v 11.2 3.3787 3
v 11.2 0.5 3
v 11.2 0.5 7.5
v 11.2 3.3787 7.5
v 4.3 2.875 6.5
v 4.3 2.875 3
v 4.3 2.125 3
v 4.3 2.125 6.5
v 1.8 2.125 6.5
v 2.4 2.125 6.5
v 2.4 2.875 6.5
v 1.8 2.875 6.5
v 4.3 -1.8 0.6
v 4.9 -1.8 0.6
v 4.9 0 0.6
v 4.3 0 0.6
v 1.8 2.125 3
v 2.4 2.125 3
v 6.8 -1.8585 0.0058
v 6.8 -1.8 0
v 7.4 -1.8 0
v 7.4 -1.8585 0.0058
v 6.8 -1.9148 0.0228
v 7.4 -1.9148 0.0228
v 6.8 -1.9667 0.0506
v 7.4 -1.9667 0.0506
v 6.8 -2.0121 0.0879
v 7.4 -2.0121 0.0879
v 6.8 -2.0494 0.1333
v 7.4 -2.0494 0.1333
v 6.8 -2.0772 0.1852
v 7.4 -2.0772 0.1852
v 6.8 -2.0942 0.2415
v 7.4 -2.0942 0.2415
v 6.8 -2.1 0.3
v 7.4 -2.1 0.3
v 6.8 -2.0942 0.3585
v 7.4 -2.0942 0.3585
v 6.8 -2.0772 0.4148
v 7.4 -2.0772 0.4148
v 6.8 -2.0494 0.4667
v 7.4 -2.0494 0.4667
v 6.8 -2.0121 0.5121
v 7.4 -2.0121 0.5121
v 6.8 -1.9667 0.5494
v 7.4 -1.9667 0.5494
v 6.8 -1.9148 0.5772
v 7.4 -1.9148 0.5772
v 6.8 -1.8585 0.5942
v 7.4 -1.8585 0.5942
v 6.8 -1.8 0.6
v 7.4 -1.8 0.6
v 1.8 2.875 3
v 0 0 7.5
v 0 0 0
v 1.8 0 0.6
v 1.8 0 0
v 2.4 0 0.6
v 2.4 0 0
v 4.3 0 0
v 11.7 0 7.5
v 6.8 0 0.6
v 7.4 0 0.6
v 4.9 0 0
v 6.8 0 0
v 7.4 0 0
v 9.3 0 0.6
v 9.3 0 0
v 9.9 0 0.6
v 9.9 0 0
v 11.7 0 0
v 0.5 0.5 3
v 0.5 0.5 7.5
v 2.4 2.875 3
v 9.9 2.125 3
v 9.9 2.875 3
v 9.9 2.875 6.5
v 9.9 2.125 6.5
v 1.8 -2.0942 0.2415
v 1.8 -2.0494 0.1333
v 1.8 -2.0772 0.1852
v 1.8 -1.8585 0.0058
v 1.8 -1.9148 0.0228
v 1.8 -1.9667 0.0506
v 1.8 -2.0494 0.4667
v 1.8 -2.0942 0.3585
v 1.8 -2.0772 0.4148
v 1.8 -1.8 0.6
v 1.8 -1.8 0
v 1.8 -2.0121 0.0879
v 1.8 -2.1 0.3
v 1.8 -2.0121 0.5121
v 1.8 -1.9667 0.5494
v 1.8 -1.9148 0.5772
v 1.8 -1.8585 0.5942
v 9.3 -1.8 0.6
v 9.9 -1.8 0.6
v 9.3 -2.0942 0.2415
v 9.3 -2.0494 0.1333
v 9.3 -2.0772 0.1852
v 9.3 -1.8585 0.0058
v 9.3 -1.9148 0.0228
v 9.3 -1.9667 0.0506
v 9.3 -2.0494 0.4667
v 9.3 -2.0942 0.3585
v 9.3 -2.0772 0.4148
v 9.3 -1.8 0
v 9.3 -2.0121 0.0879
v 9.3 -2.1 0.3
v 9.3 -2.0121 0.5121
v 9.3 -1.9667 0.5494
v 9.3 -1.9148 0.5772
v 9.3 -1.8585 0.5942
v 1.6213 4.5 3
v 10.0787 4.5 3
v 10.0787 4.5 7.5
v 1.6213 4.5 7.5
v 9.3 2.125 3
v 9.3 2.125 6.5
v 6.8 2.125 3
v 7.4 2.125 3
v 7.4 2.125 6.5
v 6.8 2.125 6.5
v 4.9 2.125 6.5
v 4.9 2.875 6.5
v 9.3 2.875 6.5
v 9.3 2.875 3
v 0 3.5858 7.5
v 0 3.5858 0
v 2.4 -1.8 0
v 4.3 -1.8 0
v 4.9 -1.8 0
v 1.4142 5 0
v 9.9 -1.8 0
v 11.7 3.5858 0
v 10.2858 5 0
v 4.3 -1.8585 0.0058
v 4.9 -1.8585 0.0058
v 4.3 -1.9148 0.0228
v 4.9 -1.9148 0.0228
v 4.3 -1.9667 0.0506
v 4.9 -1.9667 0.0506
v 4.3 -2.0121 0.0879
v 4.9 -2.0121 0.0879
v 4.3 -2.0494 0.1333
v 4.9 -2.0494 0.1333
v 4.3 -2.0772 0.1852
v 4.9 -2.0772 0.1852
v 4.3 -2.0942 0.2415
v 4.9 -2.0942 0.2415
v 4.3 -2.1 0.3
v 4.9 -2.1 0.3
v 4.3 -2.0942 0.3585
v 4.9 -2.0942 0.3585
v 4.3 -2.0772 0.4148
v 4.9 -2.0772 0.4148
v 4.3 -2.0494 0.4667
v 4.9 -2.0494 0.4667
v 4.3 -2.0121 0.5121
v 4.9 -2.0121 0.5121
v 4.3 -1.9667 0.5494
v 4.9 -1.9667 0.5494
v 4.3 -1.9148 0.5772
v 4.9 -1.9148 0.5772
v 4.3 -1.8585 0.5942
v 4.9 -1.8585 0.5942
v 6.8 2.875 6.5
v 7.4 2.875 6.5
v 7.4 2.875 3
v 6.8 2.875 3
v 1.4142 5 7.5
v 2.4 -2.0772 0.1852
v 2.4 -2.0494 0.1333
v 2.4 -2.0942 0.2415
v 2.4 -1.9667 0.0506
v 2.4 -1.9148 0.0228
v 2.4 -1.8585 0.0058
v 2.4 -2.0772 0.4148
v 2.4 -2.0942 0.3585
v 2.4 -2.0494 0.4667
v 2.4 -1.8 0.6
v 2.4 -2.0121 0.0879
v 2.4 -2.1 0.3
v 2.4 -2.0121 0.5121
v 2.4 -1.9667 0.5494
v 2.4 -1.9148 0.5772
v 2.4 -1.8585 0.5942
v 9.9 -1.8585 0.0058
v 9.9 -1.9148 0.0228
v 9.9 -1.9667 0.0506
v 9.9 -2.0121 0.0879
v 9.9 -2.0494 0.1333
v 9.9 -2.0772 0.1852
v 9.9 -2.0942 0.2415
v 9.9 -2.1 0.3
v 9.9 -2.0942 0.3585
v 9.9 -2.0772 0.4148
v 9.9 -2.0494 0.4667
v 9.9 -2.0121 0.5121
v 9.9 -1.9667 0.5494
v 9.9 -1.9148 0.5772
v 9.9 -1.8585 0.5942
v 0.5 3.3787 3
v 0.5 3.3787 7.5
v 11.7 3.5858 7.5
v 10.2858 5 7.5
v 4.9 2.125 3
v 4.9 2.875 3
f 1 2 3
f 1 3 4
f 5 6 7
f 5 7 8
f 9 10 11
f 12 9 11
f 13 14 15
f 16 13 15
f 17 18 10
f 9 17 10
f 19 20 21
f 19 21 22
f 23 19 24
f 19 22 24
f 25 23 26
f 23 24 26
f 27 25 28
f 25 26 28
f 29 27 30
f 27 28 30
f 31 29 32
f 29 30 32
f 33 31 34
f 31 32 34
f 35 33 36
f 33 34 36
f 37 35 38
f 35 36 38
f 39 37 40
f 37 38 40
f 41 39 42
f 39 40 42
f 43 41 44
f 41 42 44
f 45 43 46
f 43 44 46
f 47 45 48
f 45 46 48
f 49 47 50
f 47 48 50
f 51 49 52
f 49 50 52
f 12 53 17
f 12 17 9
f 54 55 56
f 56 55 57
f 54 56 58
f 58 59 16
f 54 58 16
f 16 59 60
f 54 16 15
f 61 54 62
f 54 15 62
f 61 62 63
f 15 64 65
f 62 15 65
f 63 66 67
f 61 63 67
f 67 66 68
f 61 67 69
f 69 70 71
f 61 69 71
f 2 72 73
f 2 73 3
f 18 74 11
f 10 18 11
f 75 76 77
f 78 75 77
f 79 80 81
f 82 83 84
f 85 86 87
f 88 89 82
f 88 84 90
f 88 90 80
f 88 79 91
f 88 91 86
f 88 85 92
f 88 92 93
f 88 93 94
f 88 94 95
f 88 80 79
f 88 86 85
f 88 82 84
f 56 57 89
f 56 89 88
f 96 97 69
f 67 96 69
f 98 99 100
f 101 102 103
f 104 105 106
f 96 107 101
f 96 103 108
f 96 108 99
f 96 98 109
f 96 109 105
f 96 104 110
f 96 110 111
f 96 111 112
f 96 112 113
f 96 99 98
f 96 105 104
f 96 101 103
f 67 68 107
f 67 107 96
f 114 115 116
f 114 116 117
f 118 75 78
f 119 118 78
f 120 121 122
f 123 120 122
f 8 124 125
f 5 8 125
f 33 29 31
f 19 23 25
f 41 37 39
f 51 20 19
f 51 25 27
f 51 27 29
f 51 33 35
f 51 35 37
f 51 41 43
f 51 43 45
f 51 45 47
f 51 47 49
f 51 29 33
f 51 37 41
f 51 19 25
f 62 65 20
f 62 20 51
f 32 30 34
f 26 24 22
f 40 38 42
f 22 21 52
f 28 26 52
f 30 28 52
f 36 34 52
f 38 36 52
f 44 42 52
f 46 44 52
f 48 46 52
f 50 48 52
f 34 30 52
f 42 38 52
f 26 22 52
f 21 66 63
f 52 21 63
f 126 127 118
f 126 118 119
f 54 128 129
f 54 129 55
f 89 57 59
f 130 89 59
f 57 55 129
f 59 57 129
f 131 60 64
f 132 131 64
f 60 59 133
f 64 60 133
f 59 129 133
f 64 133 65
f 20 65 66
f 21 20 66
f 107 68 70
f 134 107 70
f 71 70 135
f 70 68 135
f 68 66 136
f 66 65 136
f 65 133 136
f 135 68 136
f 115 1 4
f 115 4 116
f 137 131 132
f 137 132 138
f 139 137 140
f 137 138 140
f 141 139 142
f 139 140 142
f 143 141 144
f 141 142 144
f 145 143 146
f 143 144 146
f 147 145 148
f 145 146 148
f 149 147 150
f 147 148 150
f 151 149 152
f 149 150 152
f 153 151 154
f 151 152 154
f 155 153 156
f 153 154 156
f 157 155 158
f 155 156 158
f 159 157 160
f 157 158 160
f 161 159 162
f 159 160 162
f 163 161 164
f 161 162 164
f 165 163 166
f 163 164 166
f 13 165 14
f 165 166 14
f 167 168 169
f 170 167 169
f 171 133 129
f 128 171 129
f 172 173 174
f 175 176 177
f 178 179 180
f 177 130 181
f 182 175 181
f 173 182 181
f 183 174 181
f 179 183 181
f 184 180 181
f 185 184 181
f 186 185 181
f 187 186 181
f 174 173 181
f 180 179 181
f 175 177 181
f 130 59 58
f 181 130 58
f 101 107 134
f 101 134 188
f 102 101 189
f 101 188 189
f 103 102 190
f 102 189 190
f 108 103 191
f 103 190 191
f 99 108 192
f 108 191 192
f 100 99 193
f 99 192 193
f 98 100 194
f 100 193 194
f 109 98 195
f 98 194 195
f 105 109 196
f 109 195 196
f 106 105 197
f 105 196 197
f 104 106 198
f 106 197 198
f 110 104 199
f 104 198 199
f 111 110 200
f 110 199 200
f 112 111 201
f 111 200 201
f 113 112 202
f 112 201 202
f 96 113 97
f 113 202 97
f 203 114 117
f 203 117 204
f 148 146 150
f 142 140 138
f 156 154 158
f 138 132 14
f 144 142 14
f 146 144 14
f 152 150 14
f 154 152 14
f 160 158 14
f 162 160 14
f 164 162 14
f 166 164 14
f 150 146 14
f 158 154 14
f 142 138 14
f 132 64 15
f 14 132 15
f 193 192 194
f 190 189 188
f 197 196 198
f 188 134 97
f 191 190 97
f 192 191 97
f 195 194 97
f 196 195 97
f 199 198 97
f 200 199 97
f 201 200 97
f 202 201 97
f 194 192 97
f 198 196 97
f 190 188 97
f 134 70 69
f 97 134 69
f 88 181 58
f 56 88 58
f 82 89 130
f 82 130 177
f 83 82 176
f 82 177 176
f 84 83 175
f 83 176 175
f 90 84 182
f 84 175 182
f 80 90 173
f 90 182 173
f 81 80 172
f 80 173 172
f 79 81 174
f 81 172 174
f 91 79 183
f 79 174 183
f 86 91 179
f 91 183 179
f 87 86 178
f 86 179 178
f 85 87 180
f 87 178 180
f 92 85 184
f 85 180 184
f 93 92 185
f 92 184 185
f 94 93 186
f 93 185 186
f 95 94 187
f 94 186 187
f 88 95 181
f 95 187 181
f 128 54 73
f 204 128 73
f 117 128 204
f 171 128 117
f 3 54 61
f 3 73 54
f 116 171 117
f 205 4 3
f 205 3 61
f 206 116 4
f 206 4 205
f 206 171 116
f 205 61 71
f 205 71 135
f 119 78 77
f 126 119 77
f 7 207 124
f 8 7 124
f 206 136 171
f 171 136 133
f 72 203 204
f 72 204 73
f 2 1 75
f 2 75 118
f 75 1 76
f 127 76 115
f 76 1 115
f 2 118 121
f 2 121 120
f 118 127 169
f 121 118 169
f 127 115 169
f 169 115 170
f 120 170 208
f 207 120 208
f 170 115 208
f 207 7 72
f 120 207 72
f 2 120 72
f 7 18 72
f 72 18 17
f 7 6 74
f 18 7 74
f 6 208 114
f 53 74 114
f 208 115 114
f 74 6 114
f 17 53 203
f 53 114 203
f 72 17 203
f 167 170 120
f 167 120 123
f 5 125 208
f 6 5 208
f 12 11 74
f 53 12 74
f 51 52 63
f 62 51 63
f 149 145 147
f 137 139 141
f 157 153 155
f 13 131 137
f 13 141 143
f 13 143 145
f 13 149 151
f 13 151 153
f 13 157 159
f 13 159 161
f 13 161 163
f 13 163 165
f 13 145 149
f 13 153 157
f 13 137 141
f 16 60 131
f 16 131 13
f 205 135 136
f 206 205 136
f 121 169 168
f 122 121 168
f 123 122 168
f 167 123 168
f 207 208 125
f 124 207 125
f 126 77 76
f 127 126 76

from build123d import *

# Parameters (mm, degrees)
EXTRUDE_THIN1_DEPTH = 7.5
BOSS_EXTRUDE1_DEPTH = 3
BOSS_EXTRUDE2_DEPTH = 0.3
LPATTERN1_COUNT     = 4
LPATTERN1_PITCH     = 2.5


with BuildPart() as part:
    # Sketch1 → Extrude-Thin1 (new body)
    with BuildSketch(Plane.XY):
        Polygon((0, 0), (11.7, 0), (11.7, 3.585786438), (10.285786438, 5), (1.414213562, 5), (0, 3.585786438), align=None)
        Polygon((0.5, 0.5), (11.2, 0.5), (11.2, 3.378679656), (10.078679656, 4.5), (1.621320344, 4.5), (0.5, 3.378679656), align=None, mode=Mode.SUBTRACT)
    extrude(amount=EXTRUDE_THIN1_DEPTH)

    # Sketch2 → Boss-Extrude1 (add)
    with BuildSketch(Plane(origin=(0, 0, 0), x_dir=(-1, 0, 0), z_dir=(0, 0, -1))):
        Polygon((0, 0), (0, 3.585786438), (-1.414213562, 5), (-10.285786438, 5), (-11.7, 3.585786438), (-11.7, 0), align=None)
    extrude(amount=-BOSS_EXTRUDE1_DEPTH)

    # Sketch3 → Boss-Extrude2 (add, symmetric)
    with BuildSketch(Plane(origin=(9.6, 0, 0), x_dir=(0, 0, -1), z_dir=(1, 0, 0))):
        with BuildLine():
            Line((-6.5, 2.875), (0, 2.875))
            Line((0, 2.875), (0, -1.8))
            ThreePointArc((0, -1.8), (-0.3, -2.1), (-0.6, -1.8))
            Line((-0.6, -1.8), (-0.6, 2.125))
            Line((-0.6, 2.125), (-6.5, 2.125))
            Line((-6.5, 2.125), (-6.5, 2.875))
        make_face()
    boss_extrude2 = extrude(amount=BOSS_EXTRUDE2_DEPTH, both=True)

    # LPattern1: Boss-Extrude2 ×4
    with Locations(*[(-i * LPATTERN1_PITCH, 0, 0) for i in range(1, LPATTERN1_COUNT)]):
        add(boss_extrude2)


solid = part.part
